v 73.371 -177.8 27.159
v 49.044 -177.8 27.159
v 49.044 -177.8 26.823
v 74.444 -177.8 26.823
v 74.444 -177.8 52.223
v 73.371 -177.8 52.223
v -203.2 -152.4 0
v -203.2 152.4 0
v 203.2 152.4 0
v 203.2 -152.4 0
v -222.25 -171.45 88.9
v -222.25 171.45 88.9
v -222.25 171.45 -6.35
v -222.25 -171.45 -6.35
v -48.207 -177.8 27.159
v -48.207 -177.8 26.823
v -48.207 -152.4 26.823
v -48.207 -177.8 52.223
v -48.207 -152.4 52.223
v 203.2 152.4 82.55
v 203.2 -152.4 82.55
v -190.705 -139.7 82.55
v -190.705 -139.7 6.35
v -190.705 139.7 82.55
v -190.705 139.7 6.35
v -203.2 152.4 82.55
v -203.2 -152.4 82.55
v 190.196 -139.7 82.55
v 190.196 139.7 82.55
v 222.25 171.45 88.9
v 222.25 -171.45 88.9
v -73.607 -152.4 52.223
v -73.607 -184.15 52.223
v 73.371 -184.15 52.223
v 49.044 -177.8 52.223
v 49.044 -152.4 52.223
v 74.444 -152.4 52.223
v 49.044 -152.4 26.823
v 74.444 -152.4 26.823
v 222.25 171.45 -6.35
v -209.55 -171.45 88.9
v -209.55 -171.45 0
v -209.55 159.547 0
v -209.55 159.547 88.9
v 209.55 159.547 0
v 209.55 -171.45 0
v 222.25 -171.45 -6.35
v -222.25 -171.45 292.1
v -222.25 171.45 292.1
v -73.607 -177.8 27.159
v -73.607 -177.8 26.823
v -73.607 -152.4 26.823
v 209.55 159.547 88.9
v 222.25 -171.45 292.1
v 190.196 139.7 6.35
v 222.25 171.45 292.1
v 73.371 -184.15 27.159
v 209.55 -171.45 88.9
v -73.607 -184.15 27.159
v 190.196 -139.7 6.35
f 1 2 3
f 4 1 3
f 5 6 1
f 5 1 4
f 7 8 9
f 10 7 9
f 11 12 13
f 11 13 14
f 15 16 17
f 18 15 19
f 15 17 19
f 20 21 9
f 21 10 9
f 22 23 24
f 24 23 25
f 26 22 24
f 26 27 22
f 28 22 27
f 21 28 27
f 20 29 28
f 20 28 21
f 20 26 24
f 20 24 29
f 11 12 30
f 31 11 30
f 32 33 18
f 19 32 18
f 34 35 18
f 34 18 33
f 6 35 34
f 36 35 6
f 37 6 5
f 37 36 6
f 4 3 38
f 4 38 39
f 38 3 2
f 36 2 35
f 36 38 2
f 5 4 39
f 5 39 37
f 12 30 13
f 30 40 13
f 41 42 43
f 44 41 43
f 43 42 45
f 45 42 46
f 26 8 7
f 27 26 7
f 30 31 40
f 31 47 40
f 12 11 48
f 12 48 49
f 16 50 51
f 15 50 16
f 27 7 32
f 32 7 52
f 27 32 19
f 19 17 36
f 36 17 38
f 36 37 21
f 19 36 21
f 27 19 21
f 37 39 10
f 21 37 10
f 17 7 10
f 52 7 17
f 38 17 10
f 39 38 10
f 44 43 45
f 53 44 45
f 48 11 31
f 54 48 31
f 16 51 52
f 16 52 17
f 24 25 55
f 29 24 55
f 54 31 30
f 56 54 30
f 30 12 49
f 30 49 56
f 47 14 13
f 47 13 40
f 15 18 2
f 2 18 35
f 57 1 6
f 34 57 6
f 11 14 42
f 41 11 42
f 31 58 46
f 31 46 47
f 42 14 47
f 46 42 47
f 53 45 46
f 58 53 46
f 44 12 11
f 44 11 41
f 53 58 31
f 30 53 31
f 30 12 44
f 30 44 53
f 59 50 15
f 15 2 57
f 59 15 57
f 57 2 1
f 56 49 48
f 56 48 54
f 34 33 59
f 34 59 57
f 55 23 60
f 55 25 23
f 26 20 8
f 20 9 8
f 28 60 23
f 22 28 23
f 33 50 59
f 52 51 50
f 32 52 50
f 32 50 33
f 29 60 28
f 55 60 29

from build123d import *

# Parameters (mm, degrees)
F0_W      = 406.4
F0_H      = 304.8
F1_DEPTH  = 6.35
F2_W      = 12.4951104045
F2_H      = 279.4
F2_W_2    = 13.0043203354
F3_DEPTH  = 76.2
F4_W      = 444.5
F4_H      = 342.9
F5_DEPTH  = 6.35
F6_W      = 419.1
F6_H      = 11.9031353712
F7_DEPTH  = 88.9
F8_W      = 444.5
F8_H      = 342.9
F9_DEPTH  = 203.2
F10_W     = 25.4
F10_H     = 25.4
F11_DEPTH = 25.4
F12_W     = 146.9787295926
F12_H     = 25.0639826562
F13_DEPTH = 6.35


# Not quite as in the source:
# - a length typed as a fraction of an inch, garbled in the dataset ("3 / 203.2 mm" for 3/8 in), is restored


with BuildPart() as f1:
    # F0 (on Top) → F1 (new body)
    with BuildSketch(Plane.XY):
        Rectangle(F0_W, F0_H)
    extrude(amount=F1_DEPTH)

    # F2 (on face) → F3 (join)
    with BuildSketch(Plane.XY.offset(6.35)):
        Polygon((-203.2, -139.7), (-203.2, -152.4), (203.2, -152.4), (203.2, -139.7), (190.1956796646, -139.7), (-190.7048895955, -139.7), align=None)
        with Locations((-196.9524447978, 0)):
            Rectangle(F2_W, F2_H)
        with Locations((196.6978398323, 0)):
            Rectangle(F2_W_2, F2_H)
        Polygon((-203.2, 152.4), (-203.2, 139.7), (-190.7048895955, 139.7), (190.1956796646, 139.7), (203.2, 139.7), (203.2, 152.4), align=None)
    extrude(amount=F3_DEPTH)

    # F10 (on face) → F11 (join)
    with BuildSketch(Plane.XZ.offset(152.4)):
        with Locations((-60.9074905861, 39.5232320662)):
            Rectangle(F10_W, F10_H)
        with Locations((61.7435536951, 39.5232320662)):
            Rectangle(F10_W, F10_H)
    extrude(amount=F11_DEPTH)

    # F12 (on face) → F13 (join)
    with BuildSketch(Plane.XZ.offset(177.8)):
        with Locations((-0.1181257898, 39.6912407381)):
            Rectangle(F12_W, F12_H)
    extrude(amount=F13_DEPTH)


with BuildPart() as f5:
    # F4 (on face) → F5 (new body)
    with BuildSketch(Plane(origin=(0, 0, 0), x_dir=(1, 0, 0), z_dir=(0, 0, -1))):
        Rectangle(F4_W, F4_H)
    extrude(amount=F5_DEPTH)

    # F6 (on face) → F7 (join)
    with BuildSketch(Plane.XY):
        Polygon((209.55, -171.45), (222.25, -171.45), (222.25, 171.45), (209.55, 171.45), (209.55, 159.5468646288), (209.55, -158.75), align=None)
        with Locations((0, 165.4984323144)):
            Rectangle(F6_W, F6_H)
        Polygon((-209.55, 159.5468646288), (-209.55, 171.45), (-222.25, 171.45), (-222.25, -171.45), (-209.55, -171.45), align=None)
    extrude(amount=F7_DEPTH)


with BuildPart() as f9:
    # F8 (on face) → F9 (new body)
    with BuildSketch(Plane.XY.offset(88.9)):
        Rectangle(F8_W, F8_H)
    extrude(amount=F9_DEPTH)


solid = Compound([f1.part, f5.part, f9.part])
